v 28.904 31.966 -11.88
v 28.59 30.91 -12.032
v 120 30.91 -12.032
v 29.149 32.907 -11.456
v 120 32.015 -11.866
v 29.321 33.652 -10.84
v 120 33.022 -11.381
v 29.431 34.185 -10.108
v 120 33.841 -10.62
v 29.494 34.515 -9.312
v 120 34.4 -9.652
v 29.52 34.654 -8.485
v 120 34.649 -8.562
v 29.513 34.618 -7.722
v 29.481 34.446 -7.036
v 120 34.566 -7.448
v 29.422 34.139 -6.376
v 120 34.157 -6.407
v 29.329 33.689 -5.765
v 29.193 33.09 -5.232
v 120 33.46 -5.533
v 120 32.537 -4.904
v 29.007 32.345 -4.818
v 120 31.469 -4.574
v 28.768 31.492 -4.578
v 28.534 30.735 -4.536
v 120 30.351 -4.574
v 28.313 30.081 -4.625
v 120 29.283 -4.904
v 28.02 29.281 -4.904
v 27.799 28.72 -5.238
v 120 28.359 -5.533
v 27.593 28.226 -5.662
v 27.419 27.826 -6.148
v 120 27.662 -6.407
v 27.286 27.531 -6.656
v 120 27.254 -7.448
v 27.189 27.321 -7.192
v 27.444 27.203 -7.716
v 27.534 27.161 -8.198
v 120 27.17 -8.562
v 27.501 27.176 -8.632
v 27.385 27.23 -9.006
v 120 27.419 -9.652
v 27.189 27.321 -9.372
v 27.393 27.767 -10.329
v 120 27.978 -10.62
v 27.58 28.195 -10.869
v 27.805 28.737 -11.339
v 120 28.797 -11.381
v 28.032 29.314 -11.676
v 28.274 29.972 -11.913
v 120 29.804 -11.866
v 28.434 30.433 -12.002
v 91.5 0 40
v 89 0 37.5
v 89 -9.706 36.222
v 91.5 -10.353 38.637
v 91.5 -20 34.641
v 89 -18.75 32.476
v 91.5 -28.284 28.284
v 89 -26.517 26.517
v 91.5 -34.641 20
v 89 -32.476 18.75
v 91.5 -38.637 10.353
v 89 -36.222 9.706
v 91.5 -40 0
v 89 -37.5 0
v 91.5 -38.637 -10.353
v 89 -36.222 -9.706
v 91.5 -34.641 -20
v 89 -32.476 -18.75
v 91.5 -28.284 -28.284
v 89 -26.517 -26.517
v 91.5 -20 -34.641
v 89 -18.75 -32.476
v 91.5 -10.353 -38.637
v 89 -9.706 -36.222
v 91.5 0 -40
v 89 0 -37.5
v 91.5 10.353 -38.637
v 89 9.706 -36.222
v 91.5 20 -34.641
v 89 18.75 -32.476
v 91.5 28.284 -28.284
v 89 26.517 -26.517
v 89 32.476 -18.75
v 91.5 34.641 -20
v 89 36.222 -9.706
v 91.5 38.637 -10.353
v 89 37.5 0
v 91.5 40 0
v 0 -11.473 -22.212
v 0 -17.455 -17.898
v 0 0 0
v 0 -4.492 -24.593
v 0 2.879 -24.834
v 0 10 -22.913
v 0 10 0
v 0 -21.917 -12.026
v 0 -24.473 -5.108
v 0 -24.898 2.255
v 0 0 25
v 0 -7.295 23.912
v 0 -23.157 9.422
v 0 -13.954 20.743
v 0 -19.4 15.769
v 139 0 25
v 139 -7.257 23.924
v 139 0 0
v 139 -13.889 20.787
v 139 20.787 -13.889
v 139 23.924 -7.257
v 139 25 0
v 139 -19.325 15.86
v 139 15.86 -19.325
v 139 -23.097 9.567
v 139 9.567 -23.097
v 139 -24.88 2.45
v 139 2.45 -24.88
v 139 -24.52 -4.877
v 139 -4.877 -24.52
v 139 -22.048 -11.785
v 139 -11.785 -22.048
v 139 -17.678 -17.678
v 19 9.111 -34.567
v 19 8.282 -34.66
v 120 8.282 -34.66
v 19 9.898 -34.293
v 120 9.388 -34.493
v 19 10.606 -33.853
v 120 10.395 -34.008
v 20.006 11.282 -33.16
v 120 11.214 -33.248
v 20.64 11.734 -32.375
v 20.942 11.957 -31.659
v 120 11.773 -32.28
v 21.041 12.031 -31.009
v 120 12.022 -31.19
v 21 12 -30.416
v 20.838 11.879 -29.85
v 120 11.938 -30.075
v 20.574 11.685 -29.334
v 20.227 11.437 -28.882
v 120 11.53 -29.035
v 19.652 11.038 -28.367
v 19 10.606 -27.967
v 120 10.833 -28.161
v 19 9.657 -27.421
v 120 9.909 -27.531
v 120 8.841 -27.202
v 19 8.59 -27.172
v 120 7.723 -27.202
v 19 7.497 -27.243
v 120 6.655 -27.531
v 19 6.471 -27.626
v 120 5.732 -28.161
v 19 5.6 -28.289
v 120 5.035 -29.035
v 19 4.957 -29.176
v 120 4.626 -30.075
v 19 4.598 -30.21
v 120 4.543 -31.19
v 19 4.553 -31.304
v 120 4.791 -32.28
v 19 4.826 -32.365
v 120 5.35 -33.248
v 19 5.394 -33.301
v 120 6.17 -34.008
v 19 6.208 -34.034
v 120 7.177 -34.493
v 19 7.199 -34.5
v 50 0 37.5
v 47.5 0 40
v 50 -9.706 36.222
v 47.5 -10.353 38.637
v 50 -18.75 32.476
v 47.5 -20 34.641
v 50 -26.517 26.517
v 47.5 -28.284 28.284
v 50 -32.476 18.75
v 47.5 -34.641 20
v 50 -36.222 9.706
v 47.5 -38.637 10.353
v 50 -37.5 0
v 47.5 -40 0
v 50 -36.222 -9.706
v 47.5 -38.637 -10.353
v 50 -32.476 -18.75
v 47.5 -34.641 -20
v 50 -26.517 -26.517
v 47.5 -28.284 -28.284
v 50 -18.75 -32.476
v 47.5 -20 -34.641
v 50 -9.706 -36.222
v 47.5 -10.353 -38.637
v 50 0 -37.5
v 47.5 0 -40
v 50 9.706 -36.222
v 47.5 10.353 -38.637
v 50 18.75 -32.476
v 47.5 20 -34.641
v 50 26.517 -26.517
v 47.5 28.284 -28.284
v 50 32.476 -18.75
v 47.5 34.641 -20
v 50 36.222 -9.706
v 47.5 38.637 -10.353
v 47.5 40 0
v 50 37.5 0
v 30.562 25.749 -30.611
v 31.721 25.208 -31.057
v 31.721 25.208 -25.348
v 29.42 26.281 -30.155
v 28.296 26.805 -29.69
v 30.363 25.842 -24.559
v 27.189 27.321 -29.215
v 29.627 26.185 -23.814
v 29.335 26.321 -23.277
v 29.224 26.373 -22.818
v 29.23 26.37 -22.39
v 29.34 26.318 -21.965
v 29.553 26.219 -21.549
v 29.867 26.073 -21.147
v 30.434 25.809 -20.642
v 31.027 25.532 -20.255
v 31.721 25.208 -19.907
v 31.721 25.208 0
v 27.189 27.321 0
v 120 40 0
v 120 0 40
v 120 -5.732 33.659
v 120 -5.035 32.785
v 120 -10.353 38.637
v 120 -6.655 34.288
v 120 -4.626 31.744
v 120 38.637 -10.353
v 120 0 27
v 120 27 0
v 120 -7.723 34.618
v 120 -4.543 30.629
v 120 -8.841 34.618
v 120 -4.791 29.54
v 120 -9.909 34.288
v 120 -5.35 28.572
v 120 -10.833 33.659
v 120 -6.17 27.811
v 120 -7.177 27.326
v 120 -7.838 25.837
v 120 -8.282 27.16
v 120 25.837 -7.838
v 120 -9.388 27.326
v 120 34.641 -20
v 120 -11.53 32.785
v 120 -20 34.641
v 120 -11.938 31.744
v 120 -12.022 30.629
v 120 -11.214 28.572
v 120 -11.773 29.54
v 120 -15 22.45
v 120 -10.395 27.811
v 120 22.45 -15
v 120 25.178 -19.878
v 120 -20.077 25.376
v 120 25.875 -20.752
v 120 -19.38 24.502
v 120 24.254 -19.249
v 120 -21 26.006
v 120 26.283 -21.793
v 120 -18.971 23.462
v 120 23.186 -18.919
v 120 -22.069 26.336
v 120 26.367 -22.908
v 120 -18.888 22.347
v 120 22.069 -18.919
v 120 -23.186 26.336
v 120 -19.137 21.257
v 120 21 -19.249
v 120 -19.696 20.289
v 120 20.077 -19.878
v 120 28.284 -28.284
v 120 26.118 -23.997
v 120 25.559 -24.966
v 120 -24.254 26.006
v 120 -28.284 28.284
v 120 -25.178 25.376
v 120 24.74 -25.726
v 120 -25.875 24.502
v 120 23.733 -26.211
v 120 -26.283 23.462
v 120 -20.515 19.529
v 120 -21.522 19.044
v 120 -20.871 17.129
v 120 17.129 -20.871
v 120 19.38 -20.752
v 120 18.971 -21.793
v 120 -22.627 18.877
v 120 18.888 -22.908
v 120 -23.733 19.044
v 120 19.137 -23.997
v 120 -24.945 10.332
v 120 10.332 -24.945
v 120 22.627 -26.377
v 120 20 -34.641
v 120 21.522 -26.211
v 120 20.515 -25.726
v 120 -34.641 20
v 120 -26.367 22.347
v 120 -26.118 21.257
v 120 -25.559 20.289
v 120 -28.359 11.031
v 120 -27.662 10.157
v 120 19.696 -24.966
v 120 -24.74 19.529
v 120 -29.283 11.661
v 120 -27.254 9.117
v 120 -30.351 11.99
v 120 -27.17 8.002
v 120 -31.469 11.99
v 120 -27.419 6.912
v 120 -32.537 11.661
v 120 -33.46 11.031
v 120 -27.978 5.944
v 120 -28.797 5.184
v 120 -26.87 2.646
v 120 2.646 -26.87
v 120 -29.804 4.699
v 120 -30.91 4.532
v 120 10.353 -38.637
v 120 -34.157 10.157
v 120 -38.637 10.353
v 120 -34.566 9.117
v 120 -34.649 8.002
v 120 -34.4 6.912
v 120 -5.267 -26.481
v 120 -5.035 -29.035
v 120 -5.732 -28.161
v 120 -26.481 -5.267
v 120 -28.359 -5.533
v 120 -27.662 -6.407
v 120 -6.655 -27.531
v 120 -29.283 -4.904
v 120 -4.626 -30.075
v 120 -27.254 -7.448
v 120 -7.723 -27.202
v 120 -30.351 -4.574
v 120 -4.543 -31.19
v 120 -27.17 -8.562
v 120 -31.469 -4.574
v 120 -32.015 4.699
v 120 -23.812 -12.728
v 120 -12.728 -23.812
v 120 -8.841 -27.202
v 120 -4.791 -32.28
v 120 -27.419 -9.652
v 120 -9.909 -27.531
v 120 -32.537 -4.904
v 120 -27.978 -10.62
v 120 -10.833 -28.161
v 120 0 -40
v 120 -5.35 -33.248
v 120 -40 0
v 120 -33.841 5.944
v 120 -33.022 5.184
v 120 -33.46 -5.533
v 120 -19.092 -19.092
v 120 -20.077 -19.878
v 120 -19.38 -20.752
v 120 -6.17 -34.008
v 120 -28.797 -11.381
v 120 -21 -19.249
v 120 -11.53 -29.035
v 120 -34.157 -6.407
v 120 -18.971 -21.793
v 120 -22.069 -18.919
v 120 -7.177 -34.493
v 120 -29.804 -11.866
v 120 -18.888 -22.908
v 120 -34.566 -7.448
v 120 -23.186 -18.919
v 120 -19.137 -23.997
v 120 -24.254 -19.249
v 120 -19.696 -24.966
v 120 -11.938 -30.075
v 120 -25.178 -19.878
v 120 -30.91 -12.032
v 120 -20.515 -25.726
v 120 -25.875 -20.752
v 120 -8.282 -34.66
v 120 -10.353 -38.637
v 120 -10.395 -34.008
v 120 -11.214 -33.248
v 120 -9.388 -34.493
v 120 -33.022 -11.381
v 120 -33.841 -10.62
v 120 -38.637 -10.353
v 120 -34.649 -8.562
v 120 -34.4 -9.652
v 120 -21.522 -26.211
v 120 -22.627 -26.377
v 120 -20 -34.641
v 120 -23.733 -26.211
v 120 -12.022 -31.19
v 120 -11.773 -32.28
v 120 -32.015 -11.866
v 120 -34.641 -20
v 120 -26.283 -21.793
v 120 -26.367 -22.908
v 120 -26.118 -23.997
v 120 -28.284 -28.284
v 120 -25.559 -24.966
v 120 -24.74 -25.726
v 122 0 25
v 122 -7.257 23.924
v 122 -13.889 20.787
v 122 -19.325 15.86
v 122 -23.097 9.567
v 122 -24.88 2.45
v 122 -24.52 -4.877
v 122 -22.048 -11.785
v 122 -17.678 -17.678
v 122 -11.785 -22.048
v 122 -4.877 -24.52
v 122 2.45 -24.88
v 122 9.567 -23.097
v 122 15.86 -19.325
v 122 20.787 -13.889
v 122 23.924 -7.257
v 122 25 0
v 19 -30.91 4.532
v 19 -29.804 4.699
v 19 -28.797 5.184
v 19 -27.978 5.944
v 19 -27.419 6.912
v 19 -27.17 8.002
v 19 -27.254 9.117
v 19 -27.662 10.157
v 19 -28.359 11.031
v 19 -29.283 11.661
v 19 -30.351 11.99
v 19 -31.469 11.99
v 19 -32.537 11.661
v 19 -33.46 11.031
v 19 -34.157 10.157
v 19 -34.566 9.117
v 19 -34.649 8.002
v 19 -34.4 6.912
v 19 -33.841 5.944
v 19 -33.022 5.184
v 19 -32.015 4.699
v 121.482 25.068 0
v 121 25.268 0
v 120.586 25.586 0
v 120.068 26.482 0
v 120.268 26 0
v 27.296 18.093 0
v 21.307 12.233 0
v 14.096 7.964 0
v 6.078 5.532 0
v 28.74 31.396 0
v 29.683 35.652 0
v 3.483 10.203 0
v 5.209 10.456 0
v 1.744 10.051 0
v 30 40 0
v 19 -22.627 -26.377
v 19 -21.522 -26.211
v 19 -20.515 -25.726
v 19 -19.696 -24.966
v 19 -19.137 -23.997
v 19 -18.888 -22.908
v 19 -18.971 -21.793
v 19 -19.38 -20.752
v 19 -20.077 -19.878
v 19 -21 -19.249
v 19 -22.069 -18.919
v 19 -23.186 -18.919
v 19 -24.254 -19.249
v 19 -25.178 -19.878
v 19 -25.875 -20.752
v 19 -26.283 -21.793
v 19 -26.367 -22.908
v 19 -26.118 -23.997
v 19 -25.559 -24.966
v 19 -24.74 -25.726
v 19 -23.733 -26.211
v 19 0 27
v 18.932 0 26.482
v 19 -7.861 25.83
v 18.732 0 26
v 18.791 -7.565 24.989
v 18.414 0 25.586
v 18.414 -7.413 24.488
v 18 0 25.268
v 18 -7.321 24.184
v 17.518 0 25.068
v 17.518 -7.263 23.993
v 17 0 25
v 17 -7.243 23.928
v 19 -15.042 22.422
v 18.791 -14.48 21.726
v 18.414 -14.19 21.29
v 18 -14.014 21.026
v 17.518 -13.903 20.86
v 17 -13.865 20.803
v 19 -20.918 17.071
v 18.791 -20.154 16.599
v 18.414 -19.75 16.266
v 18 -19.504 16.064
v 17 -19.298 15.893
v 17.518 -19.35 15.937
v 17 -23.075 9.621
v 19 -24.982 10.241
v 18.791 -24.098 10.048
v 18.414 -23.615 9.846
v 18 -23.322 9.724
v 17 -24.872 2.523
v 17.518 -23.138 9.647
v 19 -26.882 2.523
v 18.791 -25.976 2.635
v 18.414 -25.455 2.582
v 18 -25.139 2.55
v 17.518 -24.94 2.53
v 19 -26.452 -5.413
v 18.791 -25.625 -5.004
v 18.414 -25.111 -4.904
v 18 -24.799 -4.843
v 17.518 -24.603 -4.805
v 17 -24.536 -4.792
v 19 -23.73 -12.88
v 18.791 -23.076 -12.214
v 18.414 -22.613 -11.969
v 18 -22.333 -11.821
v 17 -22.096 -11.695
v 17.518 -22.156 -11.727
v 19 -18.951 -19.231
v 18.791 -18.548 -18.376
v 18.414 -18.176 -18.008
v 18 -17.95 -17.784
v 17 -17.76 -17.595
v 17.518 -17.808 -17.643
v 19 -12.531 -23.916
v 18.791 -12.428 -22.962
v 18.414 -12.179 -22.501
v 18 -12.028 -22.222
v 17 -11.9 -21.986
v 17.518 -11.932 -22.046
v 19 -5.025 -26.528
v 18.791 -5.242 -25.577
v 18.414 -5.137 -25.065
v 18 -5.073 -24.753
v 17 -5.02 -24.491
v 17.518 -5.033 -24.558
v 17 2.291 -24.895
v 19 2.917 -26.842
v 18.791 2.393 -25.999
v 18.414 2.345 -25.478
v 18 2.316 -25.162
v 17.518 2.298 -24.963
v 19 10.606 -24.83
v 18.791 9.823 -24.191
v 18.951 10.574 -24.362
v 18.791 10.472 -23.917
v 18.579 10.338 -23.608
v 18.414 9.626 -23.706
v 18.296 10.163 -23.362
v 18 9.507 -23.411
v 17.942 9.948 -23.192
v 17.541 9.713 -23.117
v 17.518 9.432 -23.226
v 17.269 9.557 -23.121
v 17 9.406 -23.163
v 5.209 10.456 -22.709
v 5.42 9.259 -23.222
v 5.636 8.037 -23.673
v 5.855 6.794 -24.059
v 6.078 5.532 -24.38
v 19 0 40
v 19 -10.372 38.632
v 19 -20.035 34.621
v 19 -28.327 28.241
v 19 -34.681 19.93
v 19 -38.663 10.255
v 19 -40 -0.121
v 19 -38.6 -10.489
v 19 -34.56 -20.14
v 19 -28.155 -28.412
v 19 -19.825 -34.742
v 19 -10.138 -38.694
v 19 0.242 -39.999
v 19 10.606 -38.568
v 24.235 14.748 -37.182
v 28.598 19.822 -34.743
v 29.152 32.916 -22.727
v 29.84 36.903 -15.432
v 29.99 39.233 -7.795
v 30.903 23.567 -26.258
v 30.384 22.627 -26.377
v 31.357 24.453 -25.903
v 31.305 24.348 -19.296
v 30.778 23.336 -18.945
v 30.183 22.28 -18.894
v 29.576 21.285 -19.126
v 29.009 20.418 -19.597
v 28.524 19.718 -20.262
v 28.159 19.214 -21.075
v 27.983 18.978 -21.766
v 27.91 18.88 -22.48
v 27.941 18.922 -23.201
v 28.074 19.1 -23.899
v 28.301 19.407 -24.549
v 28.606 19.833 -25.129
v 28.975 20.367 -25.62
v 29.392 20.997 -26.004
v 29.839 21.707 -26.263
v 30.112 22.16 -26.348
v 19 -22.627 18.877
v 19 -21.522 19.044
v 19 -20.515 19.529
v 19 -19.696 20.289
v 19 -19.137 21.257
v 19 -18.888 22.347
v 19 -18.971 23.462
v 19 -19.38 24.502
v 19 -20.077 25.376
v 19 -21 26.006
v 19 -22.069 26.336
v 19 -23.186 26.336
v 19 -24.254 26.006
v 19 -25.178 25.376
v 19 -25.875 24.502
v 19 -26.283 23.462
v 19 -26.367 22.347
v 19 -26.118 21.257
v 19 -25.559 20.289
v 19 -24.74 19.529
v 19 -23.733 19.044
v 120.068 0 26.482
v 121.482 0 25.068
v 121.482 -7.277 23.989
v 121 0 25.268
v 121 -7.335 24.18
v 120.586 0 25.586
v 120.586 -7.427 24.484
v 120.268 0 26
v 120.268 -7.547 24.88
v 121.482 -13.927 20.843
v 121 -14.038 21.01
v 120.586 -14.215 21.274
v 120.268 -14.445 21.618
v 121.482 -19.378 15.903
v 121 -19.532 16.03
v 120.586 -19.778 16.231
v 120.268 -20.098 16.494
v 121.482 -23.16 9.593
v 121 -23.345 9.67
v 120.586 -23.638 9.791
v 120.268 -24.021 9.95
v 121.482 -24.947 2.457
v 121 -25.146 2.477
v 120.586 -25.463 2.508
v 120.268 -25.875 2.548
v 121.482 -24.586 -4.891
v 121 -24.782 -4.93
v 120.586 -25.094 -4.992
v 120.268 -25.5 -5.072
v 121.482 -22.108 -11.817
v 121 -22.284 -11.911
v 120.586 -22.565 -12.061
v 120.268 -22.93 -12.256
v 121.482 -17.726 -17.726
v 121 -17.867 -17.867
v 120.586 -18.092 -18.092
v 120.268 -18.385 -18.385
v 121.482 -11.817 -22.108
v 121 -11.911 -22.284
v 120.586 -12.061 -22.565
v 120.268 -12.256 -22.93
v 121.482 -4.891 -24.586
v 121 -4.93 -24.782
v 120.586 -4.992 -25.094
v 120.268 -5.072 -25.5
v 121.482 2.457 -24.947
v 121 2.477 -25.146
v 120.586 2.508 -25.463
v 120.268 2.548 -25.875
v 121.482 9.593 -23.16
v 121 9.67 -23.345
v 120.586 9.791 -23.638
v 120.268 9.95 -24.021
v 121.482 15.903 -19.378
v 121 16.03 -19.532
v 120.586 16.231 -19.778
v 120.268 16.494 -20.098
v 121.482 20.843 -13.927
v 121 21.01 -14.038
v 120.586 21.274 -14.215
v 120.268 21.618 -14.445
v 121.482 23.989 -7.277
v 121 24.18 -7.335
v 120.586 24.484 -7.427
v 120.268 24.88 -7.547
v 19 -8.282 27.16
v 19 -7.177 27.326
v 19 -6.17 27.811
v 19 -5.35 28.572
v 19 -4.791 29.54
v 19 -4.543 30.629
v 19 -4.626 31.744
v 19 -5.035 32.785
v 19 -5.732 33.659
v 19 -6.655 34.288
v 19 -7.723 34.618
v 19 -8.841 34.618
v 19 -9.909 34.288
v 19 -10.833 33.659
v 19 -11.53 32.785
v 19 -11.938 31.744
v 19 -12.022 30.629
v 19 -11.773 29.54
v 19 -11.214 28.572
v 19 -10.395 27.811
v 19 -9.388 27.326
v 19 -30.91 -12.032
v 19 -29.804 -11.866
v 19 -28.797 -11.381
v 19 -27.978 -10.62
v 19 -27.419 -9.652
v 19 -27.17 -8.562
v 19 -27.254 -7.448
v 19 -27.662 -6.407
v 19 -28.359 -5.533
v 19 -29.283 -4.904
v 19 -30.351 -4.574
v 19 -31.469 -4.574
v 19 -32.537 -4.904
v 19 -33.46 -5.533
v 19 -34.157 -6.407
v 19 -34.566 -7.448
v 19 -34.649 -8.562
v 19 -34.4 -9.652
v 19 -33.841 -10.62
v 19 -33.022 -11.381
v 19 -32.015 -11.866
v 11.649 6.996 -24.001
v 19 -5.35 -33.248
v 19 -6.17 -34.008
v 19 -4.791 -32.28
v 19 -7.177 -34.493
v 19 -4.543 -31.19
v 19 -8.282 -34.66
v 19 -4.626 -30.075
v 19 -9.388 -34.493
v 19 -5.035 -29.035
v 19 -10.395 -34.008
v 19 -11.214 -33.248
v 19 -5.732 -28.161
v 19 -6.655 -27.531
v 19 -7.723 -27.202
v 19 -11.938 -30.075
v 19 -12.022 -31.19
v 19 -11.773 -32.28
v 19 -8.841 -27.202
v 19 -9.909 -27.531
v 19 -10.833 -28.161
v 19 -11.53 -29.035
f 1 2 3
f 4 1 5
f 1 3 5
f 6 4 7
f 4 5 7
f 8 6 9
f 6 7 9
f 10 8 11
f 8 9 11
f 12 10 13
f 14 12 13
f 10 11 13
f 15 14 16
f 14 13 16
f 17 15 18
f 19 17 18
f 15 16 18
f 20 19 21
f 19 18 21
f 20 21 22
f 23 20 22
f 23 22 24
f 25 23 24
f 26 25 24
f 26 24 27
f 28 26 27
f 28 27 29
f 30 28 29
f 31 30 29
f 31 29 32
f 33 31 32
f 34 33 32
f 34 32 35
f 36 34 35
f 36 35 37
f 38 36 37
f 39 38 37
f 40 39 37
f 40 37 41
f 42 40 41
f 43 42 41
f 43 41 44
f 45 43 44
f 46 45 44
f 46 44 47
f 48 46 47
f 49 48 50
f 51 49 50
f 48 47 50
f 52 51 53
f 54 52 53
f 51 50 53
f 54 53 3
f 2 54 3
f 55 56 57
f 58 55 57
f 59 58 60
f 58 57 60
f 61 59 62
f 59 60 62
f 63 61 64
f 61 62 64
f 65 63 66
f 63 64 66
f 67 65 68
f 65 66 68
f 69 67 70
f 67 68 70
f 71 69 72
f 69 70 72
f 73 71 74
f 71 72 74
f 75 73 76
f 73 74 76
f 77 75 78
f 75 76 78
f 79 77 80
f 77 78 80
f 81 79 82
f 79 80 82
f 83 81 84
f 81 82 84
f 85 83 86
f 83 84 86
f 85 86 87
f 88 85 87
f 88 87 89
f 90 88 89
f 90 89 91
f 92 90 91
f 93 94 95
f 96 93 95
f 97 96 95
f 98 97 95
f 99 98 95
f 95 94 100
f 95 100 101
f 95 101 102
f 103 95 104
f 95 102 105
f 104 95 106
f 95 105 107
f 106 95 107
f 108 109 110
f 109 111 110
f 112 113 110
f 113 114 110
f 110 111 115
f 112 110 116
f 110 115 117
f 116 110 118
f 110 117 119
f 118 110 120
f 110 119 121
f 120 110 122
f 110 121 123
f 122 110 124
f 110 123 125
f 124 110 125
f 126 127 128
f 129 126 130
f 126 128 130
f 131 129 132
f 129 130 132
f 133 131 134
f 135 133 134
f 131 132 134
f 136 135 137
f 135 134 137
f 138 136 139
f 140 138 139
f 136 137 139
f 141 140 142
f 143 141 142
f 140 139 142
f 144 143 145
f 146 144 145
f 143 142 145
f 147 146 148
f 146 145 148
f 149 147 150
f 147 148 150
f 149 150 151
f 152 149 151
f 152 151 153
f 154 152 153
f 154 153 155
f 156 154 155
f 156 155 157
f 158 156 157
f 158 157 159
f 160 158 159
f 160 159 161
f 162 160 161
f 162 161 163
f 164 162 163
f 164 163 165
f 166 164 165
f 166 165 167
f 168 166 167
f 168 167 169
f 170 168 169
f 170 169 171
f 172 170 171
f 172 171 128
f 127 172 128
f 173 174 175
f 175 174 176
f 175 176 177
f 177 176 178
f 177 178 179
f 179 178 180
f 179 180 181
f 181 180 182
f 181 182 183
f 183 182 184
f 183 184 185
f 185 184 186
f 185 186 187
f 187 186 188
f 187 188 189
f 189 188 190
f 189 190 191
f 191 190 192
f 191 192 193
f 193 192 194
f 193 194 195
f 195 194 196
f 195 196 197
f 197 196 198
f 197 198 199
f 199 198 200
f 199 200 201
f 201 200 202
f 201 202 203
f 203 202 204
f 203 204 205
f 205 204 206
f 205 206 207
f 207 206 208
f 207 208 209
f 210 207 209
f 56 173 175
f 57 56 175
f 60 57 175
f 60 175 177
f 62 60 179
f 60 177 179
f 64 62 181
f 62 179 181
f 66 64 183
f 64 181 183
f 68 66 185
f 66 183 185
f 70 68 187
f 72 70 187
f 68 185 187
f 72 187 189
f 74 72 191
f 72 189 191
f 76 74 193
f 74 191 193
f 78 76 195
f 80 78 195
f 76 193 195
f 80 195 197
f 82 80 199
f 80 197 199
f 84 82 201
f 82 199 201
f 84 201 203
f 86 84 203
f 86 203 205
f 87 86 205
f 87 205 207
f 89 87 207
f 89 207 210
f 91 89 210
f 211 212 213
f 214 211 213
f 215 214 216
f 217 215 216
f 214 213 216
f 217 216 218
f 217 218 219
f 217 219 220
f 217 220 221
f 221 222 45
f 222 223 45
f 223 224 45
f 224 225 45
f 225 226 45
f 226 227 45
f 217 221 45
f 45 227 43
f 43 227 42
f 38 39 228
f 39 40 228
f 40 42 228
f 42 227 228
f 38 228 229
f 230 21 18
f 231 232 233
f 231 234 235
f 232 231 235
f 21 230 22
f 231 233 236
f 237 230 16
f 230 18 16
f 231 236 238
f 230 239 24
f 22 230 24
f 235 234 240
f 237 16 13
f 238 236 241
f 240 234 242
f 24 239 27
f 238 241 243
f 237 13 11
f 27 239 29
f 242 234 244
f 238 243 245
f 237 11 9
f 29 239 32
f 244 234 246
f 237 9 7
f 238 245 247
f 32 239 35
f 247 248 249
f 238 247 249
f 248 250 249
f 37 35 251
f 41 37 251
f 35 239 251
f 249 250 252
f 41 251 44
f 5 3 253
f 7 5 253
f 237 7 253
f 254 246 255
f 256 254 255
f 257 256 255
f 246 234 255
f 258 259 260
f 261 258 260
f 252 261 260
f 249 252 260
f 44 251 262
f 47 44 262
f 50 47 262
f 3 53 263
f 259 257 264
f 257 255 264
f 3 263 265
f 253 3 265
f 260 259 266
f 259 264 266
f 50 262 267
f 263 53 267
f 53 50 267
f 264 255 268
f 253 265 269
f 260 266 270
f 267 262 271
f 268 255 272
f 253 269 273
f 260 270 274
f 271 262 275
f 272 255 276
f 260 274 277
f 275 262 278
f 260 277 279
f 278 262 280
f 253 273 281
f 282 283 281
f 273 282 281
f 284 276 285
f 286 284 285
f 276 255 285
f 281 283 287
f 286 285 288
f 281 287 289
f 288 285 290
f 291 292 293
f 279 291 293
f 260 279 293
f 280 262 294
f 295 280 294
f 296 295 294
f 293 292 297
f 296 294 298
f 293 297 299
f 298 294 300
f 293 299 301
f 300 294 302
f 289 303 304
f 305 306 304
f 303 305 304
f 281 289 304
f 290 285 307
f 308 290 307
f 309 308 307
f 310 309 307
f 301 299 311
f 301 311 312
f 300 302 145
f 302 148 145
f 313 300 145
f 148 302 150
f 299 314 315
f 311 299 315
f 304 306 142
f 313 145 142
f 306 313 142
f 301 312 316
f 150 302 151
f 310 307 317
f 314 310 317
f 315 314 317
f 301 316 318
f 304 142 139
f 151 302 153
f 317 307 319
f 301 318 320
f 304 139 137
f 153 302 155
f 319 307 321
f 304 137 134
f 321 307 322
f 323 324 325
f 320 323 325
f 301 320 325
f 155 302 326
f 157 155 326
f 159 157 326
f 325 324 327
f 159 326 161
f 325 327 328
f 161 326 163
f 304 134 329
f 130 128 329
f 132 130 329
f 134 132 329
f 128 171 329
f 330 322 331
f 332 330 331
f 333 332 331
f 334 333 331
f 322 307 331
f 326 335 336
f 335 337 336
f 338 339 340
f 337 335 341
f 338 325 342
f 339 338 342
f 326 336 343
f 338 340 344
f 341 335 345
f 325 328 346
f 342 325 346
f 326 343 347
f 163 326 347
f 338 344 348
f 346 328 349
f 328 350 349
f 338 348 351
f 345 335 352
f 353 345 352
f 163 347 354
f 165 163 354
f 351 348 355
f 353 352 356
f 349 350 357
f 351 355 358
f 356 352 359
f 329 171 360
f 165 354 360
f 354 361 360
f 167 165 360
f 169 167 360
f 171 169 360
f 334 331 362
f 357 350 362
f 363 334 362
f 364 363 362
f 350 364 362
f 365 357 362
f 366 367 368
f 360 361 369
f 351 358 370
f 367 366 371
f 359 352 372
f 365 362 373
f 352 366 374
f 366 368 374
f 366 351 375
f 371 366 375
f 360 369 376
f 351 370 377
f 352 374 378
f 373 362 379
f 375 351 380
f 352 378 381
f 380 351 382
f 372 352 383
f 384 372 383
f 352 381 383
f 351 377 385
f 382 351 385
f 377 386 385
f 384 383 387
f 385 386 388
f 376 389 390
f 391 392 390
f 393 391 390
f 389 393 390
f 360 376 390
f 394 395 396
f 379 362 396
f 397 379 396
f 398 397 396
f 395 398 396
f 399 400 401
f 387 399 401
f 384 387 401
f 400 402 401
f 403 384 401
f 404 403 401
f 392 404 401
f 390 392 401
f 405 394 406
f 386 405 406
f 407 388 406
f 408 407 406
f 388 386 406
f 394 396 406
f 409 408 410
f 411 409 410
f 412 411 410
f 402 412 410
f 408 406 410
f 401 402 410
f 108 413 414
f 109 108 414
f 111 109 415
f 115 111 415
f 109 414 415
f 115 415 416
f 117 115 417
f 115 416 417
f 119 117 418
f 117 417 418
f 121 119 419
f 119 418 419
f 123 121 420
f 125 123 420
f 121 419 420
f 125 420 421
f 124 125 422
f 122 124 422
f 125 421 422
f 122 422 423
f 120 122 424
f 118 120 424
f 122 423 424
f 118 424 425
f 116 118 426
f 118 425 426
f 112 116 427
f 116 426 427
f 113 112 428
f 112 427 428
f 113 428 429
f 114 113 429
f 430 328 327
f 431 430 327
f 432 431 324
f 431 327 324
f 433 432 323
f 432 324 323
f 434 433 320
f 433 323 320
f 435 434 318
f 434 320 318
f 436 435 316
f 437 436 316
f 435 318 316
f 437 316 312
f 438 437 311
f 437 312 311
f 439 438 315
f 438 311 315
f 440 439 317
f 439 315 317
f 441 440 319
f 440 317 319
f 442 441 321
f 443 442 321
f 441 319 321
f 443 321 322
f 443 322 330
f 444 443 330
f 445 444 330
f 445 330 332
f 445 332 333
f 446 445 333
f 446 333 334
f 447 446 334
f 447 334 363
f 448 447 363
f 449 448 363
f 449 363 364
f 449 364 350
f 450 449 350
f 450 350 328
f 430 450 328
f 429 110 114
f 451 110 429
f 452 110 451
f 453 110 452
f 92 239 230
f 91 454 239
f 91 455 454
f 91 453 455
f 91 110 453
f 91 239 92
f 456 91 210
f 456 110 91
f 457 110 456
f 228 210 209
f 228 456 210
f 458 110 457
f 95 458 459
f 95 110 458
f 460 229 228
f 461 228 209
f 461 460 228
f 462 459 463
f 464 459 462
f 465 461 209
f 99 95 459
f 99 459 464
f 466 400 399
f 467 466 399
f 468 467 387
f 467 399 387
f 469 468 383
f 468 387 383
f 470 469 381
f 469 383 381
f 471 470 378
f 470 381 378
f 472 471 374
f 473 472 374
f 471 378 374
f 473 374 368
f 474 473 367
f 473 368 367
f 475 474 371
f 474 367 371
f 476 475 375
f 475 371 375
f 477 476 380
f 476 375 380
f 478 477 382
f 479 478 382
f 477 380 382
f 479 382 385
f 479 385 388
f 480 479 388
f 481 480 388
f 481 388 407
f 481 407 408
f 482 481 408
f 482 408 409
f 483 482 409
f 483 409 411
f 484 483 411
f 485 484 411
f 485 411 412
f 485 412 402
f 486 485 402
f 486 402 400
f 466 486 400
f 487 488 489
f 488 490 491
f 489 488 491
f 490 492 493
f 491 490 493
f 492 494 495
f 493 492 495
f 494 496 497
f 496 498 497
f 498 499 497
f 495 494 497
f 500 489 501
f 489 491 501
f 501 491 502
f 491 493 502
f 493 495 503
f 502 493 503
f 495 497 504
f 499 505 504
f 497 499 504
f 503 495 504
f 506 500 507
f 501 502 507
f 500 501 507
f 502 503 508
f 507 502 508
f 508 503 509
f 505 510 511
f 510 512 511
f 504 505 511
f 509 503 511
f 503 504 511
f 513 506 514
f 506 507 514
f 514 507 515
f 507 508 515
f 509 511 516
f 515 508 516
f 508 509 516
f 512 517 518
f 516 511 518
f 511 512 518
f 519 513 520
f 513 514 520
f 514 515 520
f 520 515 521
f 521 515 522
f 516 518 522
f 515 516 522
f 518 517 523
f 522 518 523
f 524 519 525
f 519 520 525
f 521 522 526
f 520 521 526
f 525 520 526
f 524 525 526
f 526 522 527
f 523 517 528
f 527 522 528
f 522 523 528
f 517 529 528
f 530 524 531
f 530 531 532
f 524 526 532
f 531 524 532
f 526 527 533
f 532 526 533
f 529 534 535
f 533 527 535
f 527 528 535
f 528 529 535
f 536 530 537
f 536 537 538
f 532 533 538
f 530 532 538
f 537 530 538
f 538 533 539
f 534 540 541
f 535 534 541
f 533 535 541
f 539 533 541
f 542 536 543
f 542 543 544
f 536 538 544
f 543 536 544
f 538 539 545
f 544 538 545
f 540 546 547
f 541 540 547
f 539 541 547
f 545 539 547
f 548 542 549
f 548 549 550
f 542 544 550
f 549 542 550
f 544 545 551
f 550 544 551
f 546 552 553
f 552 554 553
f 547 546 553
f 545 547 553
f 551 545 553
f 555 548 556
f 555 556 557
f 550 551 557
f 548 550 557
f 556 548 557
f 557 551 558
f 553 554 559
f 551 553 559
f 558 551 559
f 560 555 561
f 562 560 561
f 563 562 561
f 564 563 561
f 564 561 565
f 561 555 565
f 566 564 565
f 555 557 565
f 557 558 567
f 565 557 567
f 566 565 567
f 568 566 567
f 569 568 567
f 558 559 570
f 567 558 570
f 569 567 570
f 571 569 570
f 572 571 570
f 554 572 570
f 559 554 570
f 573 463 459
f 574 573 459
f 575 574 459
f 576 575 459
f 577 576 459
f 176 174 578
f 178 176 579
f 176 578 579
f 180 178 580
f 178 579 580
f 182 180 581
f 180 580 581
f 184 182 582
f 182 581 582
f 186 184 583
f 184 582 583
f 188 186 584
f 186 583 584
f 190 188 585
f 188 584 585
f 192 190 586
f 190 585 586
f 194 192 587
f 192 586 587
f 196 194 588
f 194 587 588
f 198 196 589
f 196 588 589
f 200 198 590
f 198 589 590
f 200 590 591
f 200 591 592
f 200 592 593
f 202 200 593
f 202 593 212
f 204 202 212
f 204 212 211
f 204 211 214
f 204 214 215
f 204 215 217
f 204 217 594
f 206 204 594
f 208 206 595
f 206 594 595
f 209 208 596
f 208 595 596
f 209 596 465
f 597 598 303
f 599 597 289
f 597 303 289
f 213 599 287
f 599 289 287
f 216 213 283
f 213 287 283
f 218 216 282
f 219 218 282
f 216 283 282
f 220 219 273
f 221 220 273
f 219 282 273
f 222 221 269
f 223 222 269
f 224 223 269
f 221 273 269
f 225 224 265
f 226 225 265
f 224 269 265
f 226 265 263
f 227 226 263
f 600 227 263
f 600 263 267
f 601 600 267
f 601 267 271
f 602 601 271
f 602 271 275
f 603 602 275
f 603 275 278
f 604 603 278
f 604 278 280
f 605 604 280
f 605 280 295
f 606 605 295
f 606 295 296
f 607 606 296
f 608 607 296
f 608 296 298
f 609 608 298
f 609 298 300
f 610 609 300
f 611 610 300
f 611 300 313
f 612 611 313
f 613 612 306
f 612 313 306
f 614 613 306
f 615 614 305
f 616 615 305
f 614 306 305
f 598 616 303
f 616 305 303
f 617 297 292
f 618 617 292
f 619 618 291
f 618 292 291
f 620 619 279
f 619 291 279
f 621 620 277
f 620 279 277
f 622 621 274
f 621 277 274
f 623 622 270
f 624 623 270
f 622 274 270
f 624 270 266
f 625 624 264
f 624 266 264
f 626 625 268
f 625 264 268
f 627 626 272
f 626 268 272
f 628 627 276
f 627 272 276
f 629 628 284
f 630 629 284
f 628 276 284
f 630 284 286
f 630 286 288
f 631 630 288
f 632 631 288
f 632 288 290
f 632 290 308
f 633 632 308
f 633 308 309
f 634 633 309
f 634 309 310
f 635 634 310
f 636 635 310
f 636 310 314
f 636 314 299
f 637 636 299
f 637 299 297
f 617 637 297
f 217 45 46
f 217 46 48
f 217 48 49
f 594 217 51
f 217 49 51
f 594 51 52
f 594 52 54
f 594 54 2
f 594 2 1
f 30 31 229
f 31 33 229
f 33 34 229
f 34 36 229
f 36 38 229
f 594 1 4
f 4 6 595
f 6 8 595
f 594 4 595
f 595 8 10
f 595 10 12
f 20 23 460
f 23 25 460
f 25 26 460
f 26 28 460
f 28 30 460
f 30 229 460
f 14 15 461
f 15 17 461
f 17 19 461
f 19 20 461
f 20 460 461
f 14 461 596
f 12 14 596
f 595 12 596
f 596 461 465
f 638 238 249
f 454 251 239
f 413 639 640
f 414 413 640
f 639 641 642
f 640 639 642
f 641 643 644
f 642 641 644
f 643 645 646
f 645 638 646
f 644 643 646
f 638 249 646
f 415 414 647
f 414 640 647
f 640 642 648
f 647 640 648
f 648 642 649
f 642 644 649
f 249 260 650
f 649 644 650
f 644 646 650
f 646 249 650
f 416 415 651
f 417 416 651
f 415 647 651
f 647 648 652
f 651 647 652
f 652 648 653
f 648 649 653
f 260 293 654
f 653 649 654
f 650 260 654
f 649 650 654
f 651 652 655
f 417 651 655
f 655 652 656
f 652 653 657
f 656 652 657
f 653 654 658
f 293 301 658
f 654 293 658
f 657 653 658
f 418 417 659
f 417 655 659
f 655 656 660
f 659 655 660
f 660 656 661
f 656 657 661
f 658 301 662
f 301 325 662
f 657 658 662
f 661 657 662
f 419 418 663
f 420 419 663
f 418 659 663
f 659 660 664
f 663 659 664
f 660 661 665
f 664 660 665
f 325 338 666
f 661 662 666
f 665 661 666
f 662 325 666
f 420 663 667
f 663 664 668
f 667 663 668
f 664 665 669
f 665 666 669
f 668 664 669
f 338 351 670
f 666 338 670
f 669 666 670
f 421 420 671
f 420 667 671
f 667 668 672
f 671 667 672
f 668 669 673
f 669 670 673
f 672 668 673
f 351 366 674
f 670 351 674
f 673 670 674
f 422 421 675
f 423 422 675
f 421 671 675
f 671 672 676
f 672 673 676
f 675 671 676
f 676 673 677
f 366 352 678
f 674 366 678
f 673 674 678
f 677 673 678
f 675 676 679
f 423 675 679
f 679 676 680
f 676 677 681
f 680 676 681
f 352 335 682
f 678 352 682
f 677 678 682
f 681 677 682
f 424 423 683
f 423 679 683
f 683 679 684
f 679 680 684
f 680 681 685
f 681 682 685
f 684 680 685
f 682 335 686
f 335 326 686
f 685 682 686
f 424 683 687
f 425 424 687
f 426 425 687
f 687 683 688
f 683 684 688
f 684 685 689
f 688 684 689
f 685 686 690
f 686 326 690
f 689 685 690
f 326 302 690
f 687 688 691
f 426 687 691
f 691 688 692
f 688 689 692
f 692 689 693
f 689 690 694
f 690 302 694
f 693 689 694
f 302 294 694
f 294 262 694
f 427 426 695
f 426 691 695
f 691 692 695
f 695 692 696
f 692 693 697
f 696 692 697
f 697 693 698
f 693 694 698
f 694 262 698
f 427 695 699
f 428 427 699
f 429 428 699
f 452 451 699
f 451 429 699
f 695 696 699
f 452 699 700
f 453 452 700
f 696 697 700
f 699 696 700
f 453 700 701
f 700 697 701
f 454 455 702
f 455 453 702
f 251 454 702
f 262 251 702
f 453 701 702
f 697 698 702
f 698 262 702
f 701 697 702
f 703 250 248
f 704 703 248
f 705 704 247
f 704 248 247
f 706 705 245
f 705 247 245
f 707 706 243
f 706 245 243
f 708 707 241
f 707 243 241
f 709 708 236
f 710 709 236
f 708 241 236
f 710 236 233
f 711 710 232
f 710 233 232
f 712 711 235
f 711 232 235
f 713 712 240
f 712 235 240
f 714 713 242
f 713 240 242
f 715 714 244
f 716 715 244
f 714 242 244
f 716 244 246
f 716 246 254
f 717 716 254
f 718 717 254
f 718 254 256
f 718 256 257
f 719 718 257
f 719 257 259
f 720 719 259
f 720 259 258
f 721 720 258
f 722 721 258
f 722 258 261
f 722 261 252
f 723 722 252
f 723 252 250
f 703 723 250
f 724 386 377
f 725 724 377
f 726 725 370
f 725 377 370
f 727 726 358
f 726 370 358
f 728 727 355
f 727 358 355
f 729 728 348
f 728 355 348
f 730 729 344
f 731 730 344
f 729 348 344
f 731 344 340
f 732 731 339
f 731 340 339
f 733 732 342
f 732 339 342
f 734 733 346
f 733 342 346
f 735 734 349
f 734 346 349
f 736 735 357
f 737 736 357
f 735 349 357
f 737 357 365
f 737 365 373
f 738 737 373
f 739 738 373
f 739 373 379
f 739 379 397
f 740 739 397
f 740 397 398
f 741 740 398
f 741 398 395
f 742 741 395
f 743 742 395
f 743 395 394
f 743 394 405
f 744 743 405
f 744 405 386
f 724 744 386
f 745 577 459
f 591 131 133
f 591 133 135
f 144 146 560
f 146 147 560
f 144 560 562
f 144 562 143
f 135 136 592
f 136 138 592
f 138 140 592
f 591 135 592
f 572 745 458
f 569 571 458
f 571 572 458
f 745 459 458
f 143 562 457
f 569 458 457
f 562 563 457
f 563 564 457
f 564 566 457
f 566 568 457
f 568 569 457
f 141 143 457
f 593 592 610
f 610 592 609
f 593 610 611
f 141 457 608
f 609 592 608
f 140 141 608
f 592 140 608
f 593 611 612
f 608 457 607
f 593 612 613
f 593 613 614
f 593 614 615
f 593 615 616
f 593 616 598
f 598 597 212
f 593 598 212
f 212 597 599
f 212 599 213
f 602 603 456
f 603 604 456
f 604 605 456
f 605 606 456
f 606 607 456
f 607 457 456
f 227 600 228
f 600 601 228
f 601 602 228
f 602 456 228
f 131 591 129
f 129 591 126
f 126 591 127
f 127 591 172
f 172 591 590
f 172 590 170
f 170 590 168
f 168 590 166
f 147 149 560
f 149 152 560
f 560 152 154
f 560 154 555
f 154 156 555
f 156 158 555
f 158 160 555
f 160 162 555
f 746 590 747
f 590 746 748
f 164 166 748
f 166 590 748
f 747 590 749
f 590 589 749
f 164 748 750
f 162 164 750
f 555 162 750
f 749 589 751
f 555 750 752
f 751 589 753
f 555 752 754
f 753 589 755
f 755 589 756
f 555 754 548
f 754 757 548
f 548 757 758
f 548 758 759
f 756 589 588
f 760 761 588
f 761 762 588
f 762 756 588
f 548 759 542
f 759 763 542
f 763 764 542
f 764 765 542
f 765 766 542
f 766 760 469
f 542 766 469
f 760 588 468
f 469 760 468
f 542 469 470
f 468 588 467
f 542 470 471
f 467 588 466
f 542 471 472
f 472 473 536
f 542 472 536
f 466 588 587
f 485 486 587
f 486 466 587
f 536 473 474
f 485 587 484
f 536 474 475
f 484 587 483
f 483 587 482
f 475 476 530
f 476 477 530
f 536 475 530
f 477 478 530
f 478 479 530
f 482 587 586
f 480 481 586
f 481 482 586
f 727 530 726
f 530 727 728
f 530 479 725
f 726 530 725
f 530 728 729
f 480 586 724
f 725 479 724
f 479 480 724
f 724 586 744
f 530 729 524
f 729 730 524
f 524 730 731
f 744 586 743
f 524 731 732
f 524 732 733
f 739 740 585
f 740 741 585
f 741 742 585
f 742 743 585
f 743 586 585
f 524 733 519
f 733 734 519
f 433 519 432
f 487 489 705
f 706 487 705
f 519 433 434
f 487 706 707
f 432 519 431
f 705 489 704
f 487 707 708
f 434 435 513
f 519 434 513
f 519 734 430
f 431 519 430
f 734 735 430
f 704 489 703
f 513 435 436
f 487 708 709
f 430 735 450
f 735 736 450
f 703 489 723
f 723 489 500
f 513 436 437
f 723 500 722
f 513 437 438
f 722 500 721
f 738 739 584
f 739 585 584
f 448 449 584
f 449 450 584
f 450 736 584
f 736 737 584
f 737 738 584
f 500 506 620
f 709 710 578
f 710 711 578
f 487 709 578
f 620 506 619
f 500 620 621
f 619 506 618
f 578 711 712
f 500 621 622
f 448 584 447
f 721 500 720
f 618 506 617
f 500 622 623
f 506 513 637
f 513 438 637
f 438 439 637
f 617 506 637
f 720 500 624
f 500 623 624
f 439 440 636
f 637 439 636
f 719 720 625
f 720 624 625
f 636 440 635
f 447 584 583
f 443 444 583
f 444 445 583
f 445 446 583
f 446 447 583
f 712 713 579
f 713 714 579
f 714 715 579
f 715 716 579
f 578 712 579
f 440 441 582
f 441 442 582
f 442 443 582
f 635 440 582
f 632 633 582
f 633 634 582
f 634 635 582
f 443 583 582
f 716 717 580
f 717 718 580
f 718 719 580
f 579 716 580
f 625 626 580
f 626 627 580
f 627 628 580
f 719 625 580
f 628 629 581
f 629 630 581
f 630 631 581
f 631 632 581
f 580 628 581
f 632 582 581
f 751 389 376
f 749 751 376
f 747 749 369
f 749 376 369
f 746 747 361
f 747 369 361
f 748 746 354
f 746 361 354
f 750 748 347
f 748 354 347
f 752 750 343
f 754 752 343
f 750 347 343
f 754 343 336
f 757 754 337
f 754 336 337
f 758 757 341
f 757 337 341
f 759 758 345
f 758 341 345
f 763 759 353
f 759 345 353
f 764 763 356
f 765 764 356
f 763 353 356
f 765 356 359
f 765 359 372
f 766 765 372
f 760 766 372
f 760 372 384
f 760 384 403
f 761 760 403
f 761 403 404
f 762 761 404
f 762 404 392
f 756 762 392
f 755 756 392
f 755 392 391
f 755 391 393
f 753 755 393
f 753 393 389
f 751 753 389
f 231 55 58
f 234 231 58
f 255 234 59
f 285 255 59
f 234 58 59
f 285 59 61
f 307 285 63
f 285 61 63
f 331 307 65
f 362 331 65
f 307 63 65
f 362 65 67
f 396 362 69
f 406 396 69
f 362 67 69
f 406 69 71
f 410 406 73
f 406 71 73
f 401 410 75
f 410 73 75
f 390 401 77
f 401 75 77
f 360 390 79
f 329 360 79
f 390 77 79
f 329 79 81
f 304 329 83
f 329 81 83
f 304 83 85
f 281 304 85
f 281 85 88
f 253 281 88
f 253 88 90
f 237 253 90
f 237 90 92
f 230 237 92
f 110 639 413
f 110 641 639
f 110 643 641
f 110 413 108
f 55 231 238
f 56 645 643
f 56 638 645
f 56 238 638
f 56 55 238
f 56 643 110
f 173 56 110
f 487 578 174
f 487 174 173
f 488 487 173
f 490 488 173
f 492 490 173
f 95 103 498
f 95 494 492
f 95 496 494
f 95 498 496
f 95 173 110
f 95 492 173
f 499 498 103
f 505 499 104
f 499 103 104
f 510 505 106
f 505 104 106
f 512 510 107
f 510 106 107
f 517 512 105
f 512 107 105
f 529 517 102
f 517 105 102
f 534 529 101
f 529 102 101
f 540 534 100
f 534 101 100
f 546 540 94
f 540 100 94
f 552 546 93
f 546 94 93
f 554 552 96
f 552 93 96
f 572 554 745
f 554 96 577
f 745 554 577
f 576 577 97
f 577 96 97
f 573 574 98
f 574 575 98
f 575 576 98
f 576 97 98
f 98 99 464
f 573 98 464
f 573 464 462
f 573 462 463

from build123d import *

# Parameters (mm, degrees)
SKETCH2_R          = 3.75
CUT_EXTRUDE1_DEPTH = 133.664991614
FILLET1_R          = 2
CUT_EXTRUDE2_DEPTH = 151.069983674
CUT_EXTRUDE3_DEPTH = 151.069983674


with BuildPart() as part:
    # Sketch1 → Revolve1 (revolve)
    with BuildSketch(Plane(origin=(0, 0, 0), x_dir=(1, 0, 0), z_dir=(0, 1, 0)), mode=Mode.PRIVATE) as revolve1_sk:
        Polygon((0, 0), (139, 0), (139, 25), (120, 25), (120, 40), (91.5, 40), (89, 37.5), (50, 37.5), (47.5, 40), (19, 40), (19, 25), (0, 25), align=None)
    revolve(revolve1_sk.sketch.rotate(Axis((0, 0, 0), (1, 0, 0)), 180), axis=Axis((0, 0, 0), (1, 0, 0)))

    # Sketch2 → Cut-Extrude1 (cut, through all)
    with BuildSketch(Plane(origin=(120, 0, 0), x_dir=(0, 0, -1), z_dir=(1, 0, 0))):
        with Locations((-8.282209443, 30.909626441)):
            Circle(SKETCH2_R)
        with Locations((8.282209443, 30.909626441)):
            Circle(SKETCH2_R)
        with Locations((22.627416998, 22.627416998)):
            Circle(SKETCH2_R)
        with Locations((30.909626441, 8.282209443)):
            Circle(SKETCH2_R)
        with Locations((30.909626441, -8.282209443)):
            Circle(SKETCH2_R)
        with Locations((22.627416998, -22.627416998)):
            Circle(SKETCH2_R)
        with Locations((8.282209443, -30.909626441)):
            Circle(SKETCH2_R)
        with Locations((-8.282209443, -30.909626441)):
            Circle(SKETCH2_R)
        with Locations((-22.627416998, -22.627416998)):
            Circle(SKETCH2_R)
        with Locations((-30.909626441, -8.282209443)):
            Circle(SKETCH2_R)
        with Locations((-30.909626441, 8.282209443)):
            Circle(SKETCH2_R)
        with Locations((-22.627416998, 22.627416998)):
            Circle(SKETCH2_R)
    extrude(amount=-CUT_EXTRUDE1_DEPTH, mode=Mode.SUBTRACT)

    # Fillet1
    fillet1_edges = [part.edges().sort_by_distance(p)[0] for p in [
        (120, 0, -25),
        (19, 0, -25),
    ]]
    fillet(fillet1_edges, radius=FILLET1_R)

    # Sketch3 → Cut-Extrude2 (cut, through all)
    with BuildSketch(Plane.ZY):
        with BuildLine():
            Line((0, 0), (0, 40))
            ThreePointArc((0, 40), (28.284271247, 28.284271247), (40, 0))
            Line((40, 0), (0, 0))
        make_face()
    extrude(amount=-CUT_EXTRUDE2_DEPTH, mode=Mode.SUBTRACT)

    # Sketch5 → Cut-Extrude3 (cut, through all)
    with BuildSketch(Plane.XY):
        with BuildLine():
            Line((2.644904711, 25), (5.20944533, 10.45576741))
            Line((5.20944533, 10.45576741), (6.077686218, 5.531728645))
            ThreePointArc((6.077686218, 5.531728645), (21.306650015, 12.23263309), (31.720772546, 25.208360839))
            Line((31.720772546, 25.208360839), (27.189233611, 27.321452148))
            Line((27.189233611, 27.321452148), (19, 31.140154495))
            Line((19, 31.140154495), (19, 27))
            ThreePointArc((19, 27), (18.414213562, 25.585786438), (17, 25))
            Line((17, 25), (2.644904711, 25))
        make_face()
        with BuildLine():
            Line((30, 40), (19, 40))
            Line((19, 40), (19, 31.140154495))
            Line((19, 31.140154495), (27.189233611, 27.321452148))
            ThreePointArc((27.189233611, 27.321452148), (29.288880214, 33.506811582), (30, 40))
        make_face()
        with BuildLine():
            Line((0, 25), (0, 10))
            ThreePointArc((0, 10), (2.614672282, 10.114159057), (5.20944533, 10.45576741))
            Line((5.20944533, 10.45576741), (2.644904711, 25))
            Line((2.644904711, 25), (0, 25))
        make_face()
    extrude(amount=-CUT_EXTRUDE3_DEPTH, mode=Mode.SUBTRACT)


solid = part.part
